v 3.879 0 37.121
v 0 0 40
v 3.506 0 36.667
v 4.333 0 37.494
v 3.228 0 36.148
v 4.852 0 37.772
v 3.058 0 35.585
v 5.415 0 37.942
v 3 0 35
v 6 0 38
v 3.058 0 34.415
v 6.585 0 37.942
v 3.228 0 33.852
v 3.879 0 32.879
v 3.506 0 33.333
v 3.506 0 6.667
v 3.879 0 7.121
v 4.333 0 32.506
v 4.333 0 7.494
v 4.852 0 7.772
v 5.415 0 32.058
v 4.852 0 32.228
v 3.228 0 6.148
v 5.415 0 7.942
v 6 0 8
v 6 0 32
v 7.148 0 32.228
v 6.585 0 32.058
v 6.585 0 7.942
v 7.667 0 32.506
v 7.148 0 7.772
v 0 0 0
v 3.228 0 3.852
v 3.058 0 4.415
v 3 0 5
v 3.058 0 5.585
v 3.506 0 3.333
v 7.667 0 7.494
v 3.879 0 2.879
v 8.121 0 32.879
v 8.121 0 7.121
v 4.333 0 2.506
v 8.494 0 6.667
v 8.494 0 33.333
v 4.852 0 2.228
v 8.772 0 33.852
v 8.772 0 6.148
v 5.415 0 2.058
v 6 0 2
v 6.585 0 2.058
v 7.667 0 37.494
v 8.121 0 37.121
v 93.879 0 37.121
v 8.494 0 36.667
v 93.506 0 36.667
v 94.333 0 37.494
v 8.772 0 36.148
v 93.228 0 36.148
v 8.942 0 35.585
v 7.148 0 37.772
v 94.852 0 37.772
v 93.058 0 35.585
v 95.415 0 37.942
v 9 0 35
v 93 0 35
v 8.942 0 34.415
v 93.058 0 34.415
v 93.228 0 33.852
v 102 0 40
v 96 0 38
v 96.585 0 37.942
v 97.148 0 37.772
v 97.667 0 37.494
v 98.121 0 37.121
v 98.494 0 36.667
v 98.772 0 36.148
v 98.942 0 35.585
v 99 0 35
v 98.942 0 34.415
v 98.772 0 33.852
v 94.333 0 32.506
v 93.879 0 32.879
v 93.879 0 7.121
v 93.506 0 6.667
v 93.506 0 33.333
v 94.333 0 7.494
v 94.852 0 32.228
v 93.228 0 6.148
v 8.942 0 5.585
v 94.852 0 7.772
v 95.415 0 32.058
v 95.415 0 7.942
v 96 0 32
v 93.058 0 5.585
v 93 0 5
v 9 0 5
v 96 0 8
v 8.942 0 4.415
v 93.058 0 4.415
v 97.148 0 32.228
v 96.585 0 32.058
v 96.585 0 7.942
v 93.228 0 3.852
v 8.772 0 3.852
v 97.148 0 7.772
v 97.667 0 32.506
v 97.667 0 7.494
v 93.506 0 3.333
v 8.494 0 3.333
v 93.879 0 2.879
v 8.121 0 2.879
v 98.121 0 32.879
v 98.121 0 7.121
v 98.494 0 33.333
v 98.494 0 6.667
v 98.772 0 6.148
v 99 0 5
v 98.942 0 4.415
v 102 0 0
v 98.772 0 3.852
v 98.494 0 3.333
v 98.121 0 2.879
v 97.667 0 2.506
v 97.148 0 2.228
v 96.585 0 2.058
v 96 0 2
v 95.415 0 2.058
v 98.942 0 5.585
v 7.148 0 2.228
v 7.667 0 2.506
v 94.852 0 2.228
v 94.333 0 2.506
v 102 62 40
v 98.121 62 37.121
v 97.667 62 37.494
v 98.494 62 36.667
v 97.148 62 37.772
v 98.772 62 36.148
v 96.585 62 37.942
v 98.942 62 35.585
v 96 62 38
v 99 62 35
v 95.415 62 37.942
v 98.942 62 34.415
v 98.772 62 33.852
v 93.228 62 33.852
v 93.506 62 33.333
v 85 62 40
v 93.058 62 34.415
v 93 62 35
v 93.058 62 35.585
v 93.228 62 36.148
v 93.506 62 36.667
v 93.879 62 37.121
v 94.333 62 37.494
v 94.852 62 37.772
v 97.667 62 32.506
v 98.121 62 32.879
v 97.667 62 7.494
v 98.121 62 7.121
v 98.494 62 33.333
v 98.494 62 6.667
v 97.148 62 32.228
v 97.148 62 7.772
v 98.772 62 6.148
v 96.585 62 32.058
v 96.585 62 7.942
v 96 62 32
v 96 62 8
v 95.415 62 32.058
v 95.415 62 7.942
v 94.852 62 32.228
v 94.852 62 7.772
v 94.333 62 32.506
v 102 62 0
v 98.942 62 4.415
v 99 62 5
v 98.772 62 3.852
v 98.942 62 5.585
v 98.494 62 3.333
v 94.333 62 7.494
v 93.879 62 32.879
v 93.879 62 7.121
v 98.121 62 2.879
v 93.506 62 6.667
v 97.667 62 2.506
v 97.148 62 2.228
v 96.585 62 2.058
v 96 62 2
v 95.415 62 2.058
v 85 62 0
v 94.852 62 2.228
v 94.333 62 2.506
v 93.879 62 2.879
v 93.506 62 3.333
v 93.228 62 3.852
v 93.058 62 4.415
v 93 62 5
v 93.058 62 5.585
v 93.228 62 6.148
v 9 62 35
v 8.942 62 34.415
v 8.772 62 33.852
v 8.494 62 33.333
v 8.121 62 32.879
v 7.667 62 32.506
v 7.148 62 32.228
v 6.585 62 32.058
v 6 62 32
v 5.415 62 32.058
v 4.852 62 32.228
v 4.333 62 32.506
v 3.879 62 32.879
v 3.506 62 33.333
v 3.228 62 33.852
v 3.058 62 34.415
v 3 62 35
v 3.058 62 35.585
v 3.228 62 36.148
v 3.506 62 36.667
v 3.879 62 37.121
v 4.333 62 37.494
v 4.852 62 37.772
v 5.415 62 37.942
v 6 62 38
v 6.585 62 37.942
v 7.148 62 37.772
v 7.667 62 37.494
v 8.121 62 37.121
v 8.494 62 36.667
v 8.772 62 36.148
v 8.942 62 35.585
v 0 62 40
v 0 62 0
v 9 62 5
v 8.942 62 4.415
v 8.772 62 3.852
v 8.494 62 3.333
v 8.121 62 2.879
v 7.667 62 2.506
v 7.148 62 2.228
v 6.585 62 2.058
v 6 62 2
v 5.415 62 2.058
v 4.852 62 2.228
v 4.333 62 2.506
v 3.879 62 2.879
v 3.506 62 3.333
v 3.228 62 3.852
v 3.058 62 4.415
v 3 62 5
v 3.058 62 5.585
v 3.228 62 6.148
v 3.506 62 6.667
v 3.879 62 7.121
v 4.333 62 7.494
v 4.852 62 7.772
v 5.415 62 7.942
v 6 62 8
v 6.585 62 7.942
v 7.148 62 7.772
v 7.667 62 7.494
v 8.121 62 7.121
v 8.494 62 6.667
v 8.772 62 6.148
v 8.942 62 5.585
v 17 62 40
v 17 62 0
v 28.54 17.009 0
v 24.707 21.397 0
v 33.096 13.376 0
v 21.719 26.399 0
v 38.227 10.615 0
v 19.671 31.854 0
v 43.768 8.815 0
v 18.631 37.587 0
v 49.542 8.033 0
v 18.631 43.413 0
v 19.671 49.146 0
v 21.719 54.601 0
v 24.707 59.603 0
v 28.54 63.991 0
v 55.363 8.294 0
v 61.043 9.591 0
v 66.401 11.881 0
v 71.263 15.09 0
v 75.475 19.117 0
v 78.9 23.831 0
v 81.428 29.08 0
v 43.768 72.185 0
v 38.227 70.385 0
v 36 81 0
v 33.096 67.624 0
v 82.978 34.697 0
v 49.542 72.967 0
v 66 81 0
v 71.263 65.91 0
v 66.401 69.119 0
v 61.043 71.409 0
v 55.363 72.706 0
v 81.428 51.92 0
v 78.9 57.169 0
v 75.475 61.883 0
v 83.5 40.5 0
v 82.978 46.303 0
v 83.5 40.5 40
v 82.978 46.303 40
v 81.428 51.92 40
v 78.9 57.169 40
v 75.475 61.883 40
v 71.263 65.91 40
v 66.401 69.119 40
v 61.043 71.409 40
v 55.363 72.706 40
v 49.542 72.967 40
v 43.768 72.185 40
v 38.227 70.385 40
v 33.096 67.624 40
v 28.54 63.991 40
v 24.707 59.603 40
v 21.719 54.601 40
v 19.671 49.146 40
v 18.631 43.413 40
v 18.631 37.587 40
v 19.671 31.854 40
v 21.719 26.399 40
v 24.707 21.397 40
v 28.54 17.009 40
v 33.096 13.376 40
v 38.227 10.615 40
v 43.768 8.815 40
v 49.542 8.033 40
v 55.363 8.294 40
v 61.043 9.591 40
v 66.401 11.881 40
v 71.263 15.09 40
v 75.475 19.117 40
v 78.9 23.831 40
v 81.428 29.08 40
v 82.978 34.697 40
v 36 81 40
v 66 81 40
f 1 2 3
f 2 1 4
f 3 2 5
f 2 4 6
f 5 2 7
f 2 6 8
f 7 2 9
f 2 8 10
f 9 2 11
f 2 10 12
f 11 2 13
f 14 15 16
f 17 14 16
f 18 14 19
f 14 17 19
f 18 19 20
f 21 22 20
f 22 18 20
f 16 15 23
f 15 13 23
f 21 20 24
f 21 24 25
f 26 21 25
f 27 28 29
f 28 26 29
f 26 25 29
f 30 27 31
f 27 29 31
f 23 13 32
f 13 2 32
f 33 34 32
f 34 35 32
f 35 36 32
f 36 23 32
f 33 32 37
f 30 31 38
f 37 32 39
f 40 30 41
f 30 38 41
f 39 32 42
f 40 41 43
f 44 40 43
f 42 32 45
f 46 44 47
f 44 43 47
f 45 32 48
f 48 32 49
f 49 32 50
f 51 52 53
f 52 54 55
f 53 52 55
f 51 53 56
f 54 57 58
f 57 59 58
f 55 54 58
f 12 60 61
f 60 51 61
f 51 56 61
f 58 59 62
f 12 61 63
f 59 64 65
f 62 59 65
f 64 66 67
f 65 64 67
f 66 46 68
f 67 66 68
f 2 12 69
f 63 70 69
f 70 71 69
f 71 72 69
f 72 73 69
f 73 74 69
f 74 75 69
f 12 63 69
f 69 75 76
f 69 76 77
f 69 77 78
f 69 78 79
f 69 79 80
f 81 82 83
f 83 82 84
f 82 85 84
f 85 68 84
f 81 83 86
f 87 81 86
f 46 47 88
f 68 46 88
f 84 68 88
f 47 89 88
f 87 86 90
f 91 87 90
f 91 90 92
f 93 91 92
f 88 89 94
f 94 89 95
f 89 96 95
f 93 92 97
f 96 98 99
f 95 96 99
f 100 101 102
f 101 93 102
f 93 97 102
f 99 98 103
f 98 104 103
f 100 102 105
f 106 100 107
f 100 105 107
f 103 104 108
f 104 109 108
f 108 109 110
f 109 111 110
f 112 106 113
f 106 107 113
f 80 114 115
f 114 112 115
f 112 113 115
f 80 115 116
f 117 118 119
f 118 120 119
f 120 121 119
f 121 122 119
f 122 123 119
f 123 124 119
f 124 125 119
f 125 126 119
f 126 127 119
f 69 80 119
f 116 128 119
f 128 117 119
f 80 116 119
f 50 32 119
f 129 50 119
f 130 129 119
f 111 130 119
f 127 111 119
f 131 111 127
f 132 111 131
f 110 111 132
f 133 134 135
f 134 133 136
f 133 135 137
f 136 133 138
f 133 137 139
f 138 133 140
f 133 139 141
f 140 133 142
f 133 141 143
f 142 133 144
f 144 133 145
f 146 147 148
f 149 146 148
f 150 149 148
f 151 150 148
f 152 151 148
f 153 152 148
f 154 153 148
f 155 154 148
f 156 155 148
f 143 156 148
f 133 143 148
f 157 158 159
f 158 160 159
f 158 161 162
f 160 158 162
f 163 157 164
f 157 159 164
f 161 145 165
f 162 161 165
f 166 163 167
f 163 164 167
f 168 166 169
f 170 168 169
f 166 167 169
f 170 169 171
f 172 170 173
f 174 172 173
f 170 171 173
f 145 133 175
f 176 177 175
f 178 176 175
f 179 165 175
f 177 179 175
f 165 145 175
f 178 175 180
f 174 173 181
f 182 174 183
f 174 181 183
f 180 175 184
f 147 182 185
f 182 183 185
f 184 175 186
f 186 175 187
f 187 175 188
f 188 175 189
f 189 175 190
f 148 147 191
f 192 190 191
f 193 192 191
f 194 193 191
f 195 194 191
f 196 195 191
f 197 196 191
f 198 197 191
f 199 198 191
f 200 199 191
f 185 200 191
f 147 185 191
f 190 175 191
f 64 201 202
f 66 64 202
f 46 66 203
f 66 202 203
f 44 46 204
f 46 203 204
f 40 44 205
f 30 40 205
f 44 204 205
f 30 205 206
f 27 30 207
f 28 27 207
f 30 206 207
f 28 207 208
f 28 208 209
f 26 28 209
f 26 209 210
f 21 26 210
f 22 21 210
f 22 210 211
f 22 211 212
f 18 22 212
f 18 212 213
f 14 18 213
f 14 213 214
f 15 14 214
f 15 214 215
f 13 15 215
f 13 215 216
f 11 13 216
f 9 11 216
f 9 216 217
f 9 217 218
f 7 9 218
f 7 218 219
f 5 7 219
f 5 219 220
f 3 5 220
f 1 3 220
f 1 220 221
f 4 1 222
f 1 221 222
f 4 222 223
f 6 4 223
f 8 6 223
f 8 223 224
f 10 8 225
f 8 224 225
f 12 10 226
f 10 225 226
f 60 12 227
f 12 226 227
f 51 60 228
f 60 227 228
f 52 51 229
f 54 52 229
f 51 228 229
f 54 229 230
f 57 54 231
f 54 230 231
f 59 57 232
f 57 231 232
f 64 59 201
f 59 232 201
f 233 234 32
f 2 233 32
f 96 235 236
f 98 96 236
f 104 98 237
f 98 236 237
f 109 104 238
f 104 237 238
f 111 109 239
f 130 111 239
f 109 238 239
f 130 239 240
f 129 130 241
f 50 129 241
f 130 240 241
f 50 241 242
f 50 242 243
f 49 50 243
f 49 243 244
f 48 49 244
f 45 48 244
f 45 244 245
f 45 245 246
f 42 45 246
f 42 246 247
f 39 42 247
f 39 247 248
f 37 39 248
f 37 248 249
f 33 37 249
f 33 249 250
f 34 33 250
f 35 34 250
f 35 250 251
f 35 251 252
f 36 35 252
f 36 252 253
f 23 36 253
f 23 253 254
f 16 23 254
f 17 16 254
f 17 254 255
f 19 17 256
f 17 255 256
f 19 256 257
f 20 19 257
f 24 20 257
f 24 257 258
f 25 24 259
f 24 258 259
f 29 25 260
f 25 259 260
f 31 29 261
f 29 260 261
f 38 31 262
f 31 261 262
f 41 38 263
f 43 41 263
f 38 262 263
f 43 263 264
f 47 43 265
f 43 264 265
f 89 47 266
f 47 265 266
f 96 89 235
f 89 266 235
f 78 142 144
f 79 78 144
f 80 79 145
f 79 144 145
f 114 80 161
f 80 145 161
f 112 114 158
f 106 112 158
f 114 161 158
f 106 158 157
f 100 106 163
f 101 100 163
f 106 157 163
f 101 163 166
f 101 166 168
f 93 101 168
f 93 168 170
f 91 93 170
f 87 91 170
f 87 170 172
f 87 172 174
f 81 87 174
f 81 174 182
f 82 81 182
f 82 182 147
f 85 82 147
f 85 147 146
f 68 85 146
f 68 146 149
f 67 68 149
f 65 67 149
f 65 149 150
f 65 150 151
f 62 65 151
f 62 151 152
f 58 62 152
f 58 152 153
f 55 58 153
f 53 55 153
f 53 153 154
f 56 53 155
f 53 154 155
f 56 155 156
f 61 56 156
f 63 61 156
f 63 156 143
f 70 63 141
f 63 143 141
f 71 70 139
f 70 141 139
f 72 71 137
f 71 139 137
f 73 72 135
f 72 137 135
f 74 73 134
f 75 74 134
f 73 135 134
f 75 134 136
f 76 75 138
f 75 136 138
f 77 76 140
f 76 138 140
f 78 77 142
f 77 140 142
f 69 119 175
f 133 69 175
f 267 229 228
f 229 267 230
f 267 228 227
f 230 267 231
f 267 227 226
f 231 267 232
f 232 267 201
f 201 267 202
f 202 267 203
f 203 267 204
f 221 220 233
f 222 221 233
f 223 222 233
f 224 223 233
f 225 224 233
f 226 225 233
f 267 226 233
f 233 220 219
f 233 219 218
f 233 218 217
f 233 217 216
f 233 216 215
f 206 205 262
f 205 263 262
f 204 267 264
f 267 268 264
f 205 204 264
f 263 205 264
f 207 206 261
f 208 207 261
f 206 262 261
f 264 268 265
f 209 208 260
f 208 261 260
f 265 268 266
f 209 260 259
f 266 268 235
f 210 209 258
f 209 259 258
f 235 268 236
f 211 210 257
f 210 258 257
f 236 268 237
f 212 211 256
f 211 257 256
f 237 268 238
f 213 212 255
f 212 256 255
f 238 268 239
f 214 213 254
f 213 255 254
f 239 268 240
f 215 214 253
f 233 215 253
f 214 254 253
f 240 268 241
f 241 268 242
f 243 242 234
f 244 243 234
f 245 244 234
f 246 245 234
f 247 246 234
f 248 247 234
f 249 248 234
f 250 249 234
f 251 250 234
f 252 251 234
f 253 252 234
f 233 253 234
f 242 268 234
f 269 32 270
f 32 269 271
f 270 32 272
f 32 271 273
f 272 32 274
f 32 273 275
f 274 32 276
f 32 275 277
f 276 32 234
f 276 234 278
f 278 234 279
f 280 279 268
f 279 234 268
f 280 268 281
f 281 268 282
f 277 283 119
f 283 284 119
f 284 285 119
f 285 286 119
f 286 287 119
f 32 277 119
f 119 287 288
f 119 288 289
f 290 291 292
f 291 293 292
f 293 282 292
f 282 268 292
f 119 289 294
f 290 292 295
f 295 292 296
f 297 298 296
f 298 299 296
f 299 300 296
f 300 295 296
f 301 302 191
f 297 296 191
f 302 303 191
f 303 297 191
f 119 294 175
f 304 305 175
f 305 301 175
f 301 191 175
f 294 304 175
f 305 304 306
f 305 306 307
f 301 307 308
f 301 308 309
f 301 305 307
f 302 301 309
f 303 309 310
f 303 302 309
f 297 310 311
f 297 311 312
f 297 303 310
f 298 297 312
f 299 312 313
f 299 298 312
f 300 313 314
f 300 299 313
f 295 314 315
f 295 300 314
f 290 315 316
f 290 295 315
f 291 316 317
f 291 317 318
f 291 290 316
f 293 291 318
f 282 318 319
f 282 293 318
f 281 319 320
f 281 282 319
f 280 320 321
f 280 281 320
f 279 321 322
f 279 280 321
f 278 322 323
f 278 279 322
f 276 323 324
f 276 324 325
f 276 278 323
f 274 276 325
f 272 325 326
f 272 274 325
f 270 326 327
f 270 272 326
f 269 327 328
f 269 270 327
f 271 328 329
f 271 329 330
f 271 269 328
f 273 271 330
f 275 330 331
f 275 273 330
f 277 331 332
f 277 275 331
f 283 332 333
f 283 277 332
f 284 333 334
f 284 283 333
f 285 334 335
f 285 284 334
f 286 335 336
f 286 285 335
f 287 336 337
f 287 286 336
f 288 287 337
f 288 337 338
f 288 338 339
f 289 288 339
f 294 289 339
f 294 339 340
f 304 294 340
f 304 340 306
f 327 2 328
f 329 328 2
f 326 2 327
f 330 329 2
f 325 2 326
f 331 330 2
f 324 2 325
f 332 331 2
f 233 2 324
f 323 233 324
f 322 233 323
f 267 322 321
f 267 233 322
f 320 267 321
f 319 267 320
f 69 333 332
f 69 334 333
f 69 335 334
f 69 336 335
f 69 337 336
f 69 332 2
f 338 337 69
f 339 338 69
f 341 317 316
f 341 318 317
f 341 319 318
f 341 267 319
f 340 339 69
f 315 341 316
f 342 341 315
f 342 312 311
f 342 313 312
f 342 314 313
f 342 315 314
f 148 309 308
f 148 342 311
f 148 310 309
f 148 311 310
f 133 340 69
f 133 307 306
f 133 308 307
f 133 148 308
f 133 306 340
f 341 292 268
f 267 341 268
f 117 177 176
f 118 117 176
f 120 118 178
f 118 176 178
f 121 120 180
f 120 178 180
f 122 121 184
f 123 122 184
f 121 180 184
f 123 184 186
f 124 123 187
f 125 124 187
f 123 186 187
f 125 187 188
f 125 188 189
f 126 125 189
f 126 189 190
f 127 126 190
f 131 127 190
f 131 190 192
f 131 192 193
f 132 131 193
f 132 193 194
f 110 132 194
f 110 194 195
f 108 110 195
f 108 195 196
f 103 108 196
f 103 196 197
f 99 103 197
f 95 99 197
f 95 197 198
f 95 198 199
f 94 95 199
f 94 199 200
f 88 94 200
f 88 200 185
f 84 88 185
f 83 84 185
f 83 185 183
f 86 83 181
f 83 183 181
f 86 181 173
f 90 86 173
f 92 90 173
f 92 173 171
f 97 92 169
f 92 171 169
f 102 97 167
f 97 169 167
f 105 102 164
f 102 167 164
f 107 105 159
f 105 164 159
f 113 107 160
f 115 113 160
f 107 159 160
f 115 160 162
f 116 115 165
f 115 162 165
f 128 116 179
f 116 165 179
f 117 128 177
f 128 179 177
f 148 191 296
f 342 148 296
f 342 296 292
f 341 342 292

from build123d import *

# Parameters (mm, degrees)
SKETCH1_R           = 32.5
BOSS_EXTRUDE1_DEPTH = 40
SKETCH2_R           = 3
CUT_EXTRUDE1_DEPTH  = 63


with BuildPart() as part:
    # Sketch1 → Boss-Extrude1 (new body)
    with BuildSketch(Plane.XY):
        Polygon((0, 0), (102, 0), (102, 62), (85, 62), (66, 81), (36, 81), (17, 62), (0, 62), align=None)
        with Locations((51, 40.5)):
            Circle(SKETCH1_R, mode=Mode.SUBTRACT)
    extrude(amount=BOSS_EXTRUDE1_DEPTH)

    # Sketch2 → Cut-Extrude1 (cut, through all)
    with BuildSketch(Plane(origin=(0, 62, 0), x_dir=(1, 0, 0), z_dir=(0, 1, 0))):
        with Locations((6, -5)):
            Circle(SKETCH2_R)
        with Locations((6, -35)):
            Circle(SKETCH2_R)
        with Locations((96, -5)):
            Circle(SKETCH2_R)
        with Locations((96, -35)):
            Circle(SKETCH2_R)
    extrude(amount=-CUT_EXTRUDE1_DEPTH, mode=Mode.SUBTRACT)


solid = part.part
